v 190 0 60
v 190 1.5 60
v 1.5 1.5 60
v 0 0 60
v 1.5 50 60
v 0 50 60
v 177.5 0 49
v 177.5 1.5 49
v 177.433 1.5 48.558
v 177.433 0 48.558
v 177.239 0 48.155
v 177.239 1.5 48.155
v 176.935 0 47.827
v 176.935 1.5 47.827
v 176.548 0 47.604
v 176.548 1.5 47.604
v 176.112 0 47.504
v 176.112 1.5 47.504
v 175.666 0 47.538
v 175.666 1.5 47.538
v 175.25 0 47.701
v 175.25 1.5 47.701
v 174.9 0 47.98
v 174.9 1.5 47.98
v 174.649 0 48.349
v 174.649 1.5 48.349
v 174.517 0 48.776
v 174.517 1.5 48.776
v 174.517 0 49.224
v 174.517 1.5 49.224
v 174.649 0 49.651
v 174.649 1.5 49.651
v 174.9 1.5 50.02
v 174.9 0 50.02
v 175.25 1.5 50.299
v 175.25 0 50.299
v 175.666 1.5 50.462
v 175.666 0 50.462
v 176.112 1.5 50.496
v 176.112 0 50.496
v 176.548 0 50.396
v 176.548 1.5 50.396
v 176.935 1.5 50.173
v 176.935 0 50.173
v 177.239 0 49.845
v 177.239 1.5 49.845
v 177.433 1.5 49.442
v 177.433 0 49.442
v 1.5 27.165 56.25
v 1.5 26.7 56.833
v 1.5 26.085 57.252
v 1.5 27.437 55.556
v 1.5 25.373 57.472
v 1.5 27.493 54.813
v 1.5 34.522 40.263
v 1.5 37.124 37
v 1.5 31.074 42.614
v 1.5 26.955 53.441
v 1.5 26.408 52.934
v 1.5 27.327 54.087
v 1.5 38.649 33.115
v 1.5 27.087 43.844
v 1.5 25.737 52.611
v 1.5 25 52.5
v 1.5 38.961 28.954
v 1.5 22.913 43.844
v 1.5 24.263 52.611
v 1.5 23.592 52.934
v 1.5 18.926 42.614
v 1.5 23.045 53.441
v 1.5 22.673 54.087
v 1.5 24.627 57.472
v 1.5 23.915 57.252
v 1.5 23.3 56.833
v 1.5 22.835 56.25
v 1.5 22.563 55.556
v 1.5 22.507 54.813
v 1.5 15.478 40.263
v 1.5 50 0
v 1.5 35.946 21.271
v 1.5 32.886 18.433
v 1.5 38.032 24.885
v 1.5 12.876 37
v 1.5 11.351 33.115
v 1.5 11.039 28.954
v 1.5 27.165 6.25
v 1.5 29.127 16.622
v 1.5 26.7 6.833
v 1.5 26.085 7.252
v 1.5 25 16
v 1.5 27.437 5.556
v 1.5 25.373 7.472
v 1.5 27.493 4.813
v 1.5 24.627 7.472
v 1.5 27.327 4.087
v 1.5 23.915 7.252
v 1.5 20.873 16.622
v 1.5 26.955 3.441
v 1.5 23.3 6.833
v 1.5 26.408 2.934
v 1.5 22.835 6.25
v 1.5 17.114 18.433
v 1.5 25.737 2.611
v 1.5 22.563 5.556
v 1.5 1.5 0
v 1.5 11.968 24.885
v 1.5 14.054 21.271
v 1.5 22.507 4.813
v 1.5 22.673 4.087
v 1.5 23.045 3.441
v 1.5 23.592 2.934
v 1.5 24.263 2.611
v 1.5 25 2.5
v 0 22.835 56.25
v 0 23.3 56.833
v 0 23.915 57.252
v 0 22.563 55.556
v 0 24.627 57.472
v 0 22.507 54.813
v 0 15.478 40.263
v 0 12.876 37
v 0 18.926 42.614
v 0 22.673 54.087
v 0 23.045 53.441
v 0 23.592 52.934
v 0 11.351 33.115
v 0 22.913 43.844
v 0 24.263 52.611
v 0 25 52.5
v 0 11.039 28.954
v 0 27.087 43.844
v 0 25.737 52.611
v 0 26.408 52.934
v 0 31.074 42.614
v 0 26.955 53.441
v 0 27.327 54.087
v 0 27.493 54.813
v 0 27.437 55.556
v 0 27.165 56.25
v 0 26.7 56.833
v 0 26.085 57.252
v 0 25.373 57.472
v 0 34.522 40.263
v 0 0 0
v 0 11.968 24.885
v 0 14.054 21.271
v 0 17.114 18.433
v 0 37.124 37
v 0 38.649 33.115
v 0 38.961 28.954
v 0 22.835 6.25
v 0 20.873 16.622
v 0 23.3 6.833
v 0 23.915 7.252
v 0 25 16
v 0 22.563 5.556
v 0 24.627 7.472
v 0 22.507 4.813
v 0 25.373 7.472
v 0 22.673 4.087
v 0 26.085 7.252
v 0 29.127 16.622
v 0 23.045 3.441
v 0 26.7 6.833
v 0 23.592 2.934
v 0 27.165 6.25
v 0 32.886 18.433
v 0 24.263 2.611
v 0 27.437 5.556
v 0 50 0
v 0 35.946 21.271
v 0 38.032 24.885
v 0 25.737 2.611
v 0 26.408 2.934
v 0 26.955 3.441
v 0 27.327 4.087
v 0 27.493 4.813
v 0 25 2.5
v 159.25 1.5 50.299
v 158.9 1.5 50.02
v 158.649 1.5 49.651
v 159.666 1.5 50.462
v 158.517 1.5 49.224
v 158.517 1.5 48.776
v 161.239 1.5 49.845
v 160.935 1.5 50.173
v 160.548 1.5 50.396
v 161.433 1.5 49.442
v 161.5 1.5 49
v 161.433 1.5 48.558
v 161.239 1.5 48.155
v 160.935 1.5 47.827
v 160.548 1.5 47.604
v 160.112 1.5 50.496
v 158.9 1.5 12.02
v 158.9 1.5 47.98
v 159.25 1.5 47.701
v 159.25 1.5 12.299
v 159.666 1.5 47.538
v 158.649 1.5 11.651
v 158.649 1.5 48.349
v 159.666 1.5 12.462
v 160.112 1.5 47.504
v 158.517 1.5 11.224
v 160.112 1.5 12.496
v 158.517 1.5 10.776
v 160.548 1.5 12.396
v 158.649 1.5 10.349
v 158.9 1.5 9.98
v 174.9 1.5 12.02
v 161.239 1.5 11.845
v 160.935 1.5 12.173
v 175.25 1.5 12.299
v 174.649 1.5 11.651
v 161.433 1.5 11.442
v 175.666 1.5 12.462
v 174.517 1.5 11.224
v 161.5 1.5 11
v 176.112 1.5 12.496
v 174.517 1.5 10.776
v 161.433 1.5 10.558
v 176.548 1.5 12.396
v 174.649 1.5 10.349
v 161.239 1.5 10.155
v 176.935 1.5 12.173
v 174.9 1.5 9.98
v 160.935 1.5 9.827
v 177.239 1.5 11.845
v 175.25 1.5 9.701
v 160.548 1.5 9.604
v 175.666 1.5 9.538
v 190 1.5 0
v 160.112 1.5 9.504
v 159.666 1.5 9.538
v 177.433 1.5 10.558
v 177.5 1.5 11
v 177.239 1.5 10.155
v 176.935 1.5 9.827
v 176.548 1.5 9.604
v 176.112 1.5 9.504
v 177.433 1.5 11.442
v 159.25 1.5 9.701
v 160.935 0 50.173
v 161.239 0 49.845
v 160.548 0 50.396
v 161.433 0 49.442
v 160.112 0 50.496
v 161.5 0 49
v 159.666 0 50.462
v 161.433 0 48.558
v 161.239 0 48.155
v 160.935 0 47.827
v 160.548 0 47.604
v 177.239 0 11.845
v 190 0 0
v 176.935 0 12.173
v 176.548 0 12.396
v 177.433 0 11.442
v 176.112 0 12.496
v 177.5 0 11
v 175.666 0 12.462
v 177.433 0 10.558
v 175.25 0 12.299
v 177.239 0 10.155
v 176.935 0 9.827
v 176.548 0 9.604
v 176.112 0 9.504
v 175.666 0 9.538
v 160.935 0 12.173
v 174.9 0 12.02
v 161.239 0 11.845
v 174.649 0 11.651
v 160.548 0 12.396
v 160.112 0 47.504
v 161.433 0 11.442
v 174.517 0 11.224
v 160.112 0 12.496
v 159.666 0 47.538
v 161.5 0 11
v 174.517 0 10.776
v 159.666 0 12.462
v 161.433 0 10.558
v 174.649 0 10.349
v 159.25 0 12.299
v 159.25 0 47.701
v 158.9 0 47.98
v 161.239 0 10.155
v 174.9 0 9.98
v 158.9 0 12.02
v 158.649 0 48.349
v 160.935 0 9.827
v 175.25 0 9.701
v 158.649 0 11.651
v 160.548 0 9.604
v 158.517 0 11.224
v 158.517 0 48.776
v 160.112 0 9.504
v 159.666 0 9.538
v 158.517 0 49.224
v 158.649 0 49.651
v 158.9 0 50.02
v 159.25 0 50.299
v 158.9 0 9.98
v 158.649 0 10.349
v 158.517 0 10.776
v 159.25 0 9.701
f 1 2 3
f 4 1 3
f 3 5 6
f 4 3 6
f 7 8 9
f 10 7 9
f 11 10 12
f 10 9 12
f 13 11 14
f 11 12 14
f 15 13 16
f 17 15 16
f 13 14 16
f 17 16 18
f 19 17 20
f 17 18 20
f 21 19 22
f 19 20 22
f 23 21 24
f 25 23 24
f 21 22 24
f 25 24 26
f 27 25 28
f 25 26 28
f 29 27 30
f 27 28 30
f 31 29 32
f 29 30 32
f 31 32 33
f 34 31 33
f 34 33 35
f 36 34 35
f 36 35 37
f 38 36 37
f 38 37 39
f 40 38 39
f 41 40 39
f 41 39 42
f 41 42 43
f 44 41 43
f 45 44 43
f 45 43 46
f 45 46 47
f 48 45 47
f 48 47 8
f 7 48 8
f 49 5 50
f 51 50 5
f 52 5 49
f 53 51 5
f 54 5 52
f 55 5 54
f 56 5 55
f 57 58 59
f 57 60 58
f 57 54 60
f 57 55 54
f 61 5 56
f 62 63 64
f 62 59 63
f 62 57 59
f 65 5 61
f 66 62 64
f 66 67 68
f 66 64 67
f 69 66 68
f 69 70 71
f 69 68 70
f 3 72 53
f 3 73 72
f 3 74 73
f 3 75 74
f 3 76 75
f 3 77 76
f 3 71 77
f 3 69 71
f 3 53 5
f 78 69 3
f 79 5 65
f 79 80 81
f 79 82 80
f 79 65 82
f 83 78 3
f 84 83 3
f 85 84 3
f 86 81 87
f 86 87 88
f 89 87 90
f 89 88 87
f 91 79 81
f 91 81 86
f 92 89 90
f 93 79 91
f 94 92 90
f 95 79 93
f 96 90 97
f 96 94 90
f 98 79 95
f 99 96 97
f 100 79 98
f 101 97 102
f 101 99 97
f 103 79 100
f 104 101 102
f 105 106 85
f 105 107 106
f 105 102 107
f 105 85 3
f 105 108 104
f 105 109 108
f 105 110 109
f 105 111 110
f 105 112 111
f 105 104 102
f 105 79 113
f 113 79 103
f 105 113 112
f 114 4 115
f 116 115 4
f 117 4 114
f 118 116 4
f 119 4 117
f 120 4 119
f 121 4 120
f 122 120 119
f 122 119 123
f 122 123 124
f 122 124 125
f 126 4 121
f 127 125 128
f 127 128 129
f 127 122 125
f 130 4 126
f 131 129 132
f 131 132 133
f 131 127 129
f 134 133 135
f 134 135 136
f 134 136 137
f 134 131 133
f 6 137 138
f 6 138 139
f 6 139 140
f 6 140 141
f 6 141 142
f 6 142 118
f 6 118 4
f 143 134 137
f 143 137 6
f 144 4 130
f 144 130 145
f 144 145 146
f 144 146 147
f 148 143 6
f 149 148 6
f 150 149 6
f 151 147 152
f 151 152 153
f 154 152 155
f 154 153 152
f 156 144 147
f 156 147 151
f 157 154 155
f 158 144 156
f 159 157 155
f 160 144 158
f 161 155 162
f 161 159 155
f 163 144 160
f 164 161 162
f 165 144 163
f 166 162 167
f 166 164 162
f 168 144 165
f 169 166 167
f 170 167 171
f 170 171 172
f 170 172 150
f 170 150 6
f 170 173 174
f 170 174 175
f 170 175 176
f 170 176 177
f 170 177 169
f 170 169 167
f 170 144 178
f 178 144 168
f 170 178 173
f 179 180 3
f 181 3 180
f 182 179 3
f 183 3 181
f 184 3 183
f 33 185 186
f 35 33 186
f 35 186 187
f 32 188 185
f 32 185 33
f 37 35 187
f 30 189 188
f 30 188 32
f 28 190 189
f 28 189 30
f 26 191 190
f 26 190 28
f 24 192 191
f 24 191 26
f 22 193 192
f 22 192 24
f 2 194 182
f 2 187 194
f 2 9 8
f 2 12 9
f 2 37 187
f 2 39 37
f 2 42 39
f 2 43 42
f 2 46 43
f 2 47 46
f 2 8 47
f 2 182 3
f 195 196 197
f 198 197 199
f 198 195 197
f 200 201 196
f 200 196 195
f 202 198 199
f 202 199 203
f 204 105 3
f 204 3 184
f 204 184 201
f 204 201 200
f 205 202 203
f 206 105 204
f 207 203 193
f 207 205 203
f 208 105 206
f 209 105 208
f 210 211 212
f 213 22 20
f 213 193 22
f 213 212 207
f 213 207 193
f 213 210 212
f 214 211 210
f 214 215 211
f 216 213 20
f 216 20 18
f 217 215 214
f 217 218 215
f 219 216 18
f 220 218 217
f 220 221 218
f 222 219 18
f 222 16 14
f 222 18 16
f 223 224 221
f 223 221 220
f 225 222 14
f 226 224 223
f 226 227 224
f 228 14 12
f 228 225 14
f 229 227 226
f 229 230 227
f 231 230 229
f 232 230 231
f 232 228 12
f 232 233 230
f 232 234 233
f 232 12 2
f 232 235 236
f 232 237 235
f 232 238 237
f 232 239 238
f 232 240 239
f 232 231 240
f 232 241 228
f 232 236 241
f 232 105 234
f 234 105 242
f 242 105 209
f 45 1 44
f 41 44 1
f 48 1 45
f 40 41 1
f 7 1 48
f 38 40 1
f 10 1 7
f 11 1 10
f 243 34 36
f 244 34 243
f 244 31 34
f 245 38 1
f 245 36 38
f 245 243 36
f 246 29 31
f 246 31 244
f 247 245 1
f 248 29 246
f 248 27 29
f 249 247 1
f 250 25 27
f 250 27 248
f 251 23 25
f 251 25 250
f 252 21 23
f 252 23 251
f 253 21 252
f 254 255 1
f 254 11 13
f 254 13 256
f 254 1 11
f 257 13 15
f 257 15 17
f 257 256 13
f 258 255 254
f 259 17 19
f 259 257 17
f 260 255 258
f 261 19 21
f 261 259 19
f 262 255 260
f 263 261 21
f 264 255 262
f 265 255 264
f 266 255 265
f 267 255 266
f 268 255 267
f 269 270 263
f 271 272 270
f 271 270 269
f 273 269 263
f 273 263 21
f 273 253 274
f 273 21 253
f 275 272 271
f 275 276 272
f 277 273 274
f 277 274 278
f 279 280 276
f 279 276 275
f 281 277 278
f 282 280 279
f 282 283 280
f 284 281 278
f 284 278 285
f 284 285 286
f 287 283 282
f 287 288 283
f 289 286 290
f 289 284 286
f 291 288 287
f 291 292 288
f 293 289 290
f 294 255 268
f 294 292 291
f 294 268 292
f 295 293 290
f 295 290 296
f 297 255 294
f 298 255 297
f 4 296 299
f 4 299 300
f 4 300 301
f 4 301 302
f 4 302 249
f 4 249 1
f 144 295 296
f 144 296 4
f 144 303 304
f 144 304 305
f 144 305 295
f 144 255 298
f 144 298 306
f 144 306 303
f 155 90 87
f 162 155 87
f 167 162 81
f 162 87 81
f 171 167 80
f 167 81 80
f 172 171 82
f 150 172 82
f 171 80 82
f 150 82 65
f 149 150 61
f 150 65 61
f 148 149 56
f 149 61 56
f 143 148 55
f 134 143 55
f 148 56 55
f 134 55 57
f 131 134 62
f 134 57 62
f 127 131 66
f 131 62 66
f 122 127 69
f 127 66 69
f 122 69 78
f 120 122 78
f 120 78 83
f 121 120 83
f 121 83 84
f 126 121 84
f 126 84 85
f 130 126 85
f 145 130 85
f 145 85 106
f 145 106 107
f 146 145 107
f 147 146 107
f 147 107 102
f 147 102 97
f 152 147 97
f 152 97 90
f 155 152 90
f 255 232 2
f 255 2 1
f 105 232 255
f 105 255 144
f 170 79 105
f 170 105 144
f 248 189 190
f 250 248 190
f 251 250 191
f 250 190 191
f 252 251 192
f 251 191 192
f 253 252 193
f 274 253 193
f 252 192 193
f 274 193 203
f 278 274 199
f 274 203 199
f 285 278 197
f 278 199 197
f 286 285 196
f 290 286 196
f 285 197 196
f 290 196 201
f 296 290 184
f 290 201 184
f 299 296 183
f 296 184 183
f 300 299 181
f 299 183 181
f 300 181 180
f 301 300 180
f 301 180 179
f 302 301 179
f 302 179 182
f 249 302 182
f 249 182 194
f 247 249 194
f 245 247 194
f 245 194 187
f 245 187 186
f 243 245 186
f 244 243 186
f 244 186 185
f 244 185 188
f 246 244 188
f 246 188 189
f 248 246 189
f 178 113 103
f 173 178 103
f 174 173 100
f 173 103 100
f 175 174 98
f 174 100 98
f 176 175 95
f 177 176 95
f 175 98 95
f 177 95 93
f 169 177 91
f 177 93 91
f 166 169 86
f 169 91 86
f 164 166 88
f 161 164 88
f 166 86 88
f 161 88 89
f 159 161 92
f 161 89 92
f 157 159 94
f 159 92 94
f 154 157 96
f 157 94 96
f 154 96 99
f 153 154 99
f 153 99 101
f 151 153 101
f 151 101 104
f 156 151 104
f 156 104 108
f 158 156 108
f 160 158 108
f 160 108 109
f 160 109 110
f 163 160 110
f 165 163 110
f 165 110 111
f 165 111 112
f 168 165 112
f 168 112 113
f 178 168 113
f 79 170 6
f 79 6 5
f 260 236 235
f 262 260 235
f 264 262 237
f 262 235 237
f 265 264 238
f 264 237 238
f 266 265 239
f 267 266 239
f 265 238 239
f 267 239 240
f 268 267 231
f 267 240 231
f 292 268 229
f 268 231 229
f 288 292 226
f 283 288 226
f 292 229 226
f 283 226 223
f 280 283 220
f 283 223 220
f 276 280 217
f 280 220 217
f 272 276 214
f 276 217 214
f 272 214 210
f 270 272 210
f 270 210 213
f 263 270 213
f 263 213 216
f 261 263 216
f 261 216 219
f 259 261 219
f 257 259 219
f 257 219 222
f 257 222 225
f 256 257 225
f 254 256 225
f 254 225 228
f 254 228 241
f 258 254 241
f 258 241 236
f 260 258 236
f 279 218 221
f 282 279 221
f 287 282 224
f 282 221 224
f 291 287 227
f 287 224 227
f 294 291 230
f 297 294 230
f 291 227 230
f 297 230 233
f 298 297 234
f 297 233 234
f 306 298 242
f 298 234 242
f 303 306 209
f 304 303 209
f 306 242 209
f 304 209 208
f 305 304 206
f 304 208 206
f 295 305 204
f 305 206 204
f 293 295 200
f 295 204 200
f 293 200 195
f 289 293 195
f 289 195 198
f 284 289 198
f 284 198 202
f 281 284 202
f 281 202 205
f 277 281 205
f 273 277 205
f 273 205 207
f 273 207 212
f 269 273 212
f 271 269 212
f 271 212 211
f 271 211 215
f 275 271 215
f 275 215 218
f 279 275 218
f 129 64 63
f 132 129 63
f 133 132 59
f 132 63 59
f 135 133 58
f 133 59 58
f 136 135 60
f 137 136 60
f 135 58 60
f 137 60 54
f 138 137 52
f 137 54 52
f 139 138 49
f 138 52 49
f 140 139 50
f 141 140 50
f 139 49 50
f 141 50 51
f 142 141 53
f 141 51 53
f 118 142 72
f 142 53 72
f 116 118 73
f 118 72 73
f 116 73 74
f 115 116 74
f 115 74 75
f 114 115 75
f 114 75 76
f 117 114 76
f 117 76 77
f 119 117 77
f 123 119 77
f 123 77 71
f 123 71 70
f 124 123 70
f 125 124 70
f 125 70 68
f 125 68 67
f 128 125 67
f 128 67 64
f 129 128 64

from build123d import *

# Parameters (mm, degrees)
BOSS_EXTRUDE1_DEPTH = 60
CUT_EXTRUDE1_REACH  = 3.5
SKETCH2_R           = 14
SKETCH2_R_2         = 2.5
CUT_EXTRUDE2_REACH  = 3.5
SKETCH3_R           = 1.5


with BuildPart() as part:
    # Sketch1 → Boss-Extrude1 (new body)
    with BuildSketch(Plane.XY):
        Polygon((0, 0), (0, 50), (1.5, 50), (1.5, 1.5), (190, 1.5), (190, 0), align=None)
    extrude(amount=BOSS_EXTRUDE1_DEPTH)

    # Sketch2 → Cut-Extrude1 (cut, up to next)
    with BuildSketch(Plane(origin=(1.5, 0, 0), x_dir=(0, 0, -1), z_dir=(1, 0, 0)), mode=Mode.PRIVATE) as cut_extrude1_sk1:
        with Locations((-30, 25)):
            Circle(SKETCH2_R)
    cut_extrude1_tool1 = extrude(cut_extrude1_sk1.sketch, amount=-CUT_EXTRUDE1_REACH, mode=Mode.PRIVATE) & part.part
    add(cut_extrude1_tool1.solids().sort_by_distance((1.5, 25, 30))[0], mode=Mode.SUBTRACT)
    # Sketch2 → Cut-Extrude1 (cut, up to next)
    with BuildSketch(Plane(origin=(1.5, 0, 0), x_dir=(0, 0, -1), z_dir=(1, 0, 0)), mode=Mode.PRIVATE) as cut_extrude1_sk2:
        with Locations((-55, 25)):
            Circle(SKETCH2_R_2)
    cut_extrude1_tool2 = extrude(cut_extrude1_sk2.sketch, amount=-CUT_EXTRUDE1_REACH, mode=Mode.PRIVATE) & part.part
    add(cut_extrude1_tool2.solids().sort_by_distance((1.5, 25, 55))[0], mode=Mode.SUBTRACT)
    # Sketch2 → Cut-Extrude1 (cut, up to next)
    with BuildSketch(Plane(origin=(1.5, 0, 0), x_dir=(0, 0, -1), z_dir=(1, 0, 0)), mode=Mode.PRIVATE) as cut_extrude1_sk3:
        with Locations((-5, 25)):
            Circle(SKETCH2_R_2)
    cut_extrude1_tool3 = extrude(cut_extrude1_sk3.sketch, amount=-CUT_EXTRUDE1_REACH, mode=Mode.PRIVATE) & part.part
    add(cut_extrude1_tool3.solids().sort_by_distance((1.5, 25, 5))[0], mode=Mode.SUBTRACT)

    # Sketch3 → Cut-Extrude2 (cut, up to next)
    with BuildSketch(Plane(origin=(0, 1.5, 0), x_dir=(1, 0, 0), z_dir=(0, 1, 0)), mode=Mode.PRIVATE) as cut_extrude2_sk1:
        with Locations((160, -11)):
            Circle(SKETCH3_R)
    cut_extrude2_tool1 = extrude(cut_extrude2_sk1.sketch, amount=-CUT_EXTRUDE2_REACH, mode=Mode.PRIVATE) & part.part
    add(cut_extrude2_tool1.solids().sort_by_distance((160, 1.5, 11))[0], mode=Mode.SUBTRACT)
    # Sketch3 → Cut-Extrude2 (cut, up to next)
    with BuildSketch(Plane(origin=(0, 1.5, 0), x_dir=(1, 0, 0), z_dir=(0, 1, 0)), mode=Mode.PRIVATE) as cut_extrude2_sk2:
        with Locations((176, -11)):
            Circle(SKETCH3_R)
    cut_extrude2_tool2 = extrude(cut_extrude2_sk2.sketch, amount=-CUT_EXTRUDE2_REACH, mode=Mode.PRIVATE) & part.part
    add(cut_extrude2_tool2.solids().sort_by_distance((176, 1.5, 11))[0], mode=Mode.SUBTRACT)
    # Sketch3 → Cut-Extrude2 (cut, up to next)
    with BuildSketch(Plane(origin=(0, 1.5, 0), x_dir=(1, 0, 0), z_dir=(0, 1, 0)), mode=Mode.PRIVATE) as cut_extrude2_sk3:
        with Locations((176, -49)):
            Circle(SKETCH3_R)
    cut_extrude2_tool3 = extrude(cut_extrude2_sk3.sketch, amount=-CUT_EXTRUDE2_REACH, mode=Mode.PRIVATE) & part.part
    add(cut_extrude2_tool3.solids().sort_by_distance((176, 1.5, 49))[0], mode=Mode.SUBTRACT)
    # Sketch3 → Cut-Extrude2 (cut, up to next)
    with BuildSketch(Plane(origin=(0, 1.5, 0), x_dir=(1, 0, 0), z_dir=(0, 1, 0)), mode=Mode.PRIVATE) as cut_extrude2_sk4:
        with Locations((160, -49)):
            Circle(SKETCH3_R)
    cut_extrude2_tool4 = extrude(cut_extrude2_sk4.sketch, amount=-CUT_EXTRUDE2_REACH, mode=Mode.PRIVATE) & part.part
    add(cut_extrude2_tool4.solids().sort_by_distance((160, 1.5, 49))[0], mode=Mode.SUBTRACT)


solid = part.part
